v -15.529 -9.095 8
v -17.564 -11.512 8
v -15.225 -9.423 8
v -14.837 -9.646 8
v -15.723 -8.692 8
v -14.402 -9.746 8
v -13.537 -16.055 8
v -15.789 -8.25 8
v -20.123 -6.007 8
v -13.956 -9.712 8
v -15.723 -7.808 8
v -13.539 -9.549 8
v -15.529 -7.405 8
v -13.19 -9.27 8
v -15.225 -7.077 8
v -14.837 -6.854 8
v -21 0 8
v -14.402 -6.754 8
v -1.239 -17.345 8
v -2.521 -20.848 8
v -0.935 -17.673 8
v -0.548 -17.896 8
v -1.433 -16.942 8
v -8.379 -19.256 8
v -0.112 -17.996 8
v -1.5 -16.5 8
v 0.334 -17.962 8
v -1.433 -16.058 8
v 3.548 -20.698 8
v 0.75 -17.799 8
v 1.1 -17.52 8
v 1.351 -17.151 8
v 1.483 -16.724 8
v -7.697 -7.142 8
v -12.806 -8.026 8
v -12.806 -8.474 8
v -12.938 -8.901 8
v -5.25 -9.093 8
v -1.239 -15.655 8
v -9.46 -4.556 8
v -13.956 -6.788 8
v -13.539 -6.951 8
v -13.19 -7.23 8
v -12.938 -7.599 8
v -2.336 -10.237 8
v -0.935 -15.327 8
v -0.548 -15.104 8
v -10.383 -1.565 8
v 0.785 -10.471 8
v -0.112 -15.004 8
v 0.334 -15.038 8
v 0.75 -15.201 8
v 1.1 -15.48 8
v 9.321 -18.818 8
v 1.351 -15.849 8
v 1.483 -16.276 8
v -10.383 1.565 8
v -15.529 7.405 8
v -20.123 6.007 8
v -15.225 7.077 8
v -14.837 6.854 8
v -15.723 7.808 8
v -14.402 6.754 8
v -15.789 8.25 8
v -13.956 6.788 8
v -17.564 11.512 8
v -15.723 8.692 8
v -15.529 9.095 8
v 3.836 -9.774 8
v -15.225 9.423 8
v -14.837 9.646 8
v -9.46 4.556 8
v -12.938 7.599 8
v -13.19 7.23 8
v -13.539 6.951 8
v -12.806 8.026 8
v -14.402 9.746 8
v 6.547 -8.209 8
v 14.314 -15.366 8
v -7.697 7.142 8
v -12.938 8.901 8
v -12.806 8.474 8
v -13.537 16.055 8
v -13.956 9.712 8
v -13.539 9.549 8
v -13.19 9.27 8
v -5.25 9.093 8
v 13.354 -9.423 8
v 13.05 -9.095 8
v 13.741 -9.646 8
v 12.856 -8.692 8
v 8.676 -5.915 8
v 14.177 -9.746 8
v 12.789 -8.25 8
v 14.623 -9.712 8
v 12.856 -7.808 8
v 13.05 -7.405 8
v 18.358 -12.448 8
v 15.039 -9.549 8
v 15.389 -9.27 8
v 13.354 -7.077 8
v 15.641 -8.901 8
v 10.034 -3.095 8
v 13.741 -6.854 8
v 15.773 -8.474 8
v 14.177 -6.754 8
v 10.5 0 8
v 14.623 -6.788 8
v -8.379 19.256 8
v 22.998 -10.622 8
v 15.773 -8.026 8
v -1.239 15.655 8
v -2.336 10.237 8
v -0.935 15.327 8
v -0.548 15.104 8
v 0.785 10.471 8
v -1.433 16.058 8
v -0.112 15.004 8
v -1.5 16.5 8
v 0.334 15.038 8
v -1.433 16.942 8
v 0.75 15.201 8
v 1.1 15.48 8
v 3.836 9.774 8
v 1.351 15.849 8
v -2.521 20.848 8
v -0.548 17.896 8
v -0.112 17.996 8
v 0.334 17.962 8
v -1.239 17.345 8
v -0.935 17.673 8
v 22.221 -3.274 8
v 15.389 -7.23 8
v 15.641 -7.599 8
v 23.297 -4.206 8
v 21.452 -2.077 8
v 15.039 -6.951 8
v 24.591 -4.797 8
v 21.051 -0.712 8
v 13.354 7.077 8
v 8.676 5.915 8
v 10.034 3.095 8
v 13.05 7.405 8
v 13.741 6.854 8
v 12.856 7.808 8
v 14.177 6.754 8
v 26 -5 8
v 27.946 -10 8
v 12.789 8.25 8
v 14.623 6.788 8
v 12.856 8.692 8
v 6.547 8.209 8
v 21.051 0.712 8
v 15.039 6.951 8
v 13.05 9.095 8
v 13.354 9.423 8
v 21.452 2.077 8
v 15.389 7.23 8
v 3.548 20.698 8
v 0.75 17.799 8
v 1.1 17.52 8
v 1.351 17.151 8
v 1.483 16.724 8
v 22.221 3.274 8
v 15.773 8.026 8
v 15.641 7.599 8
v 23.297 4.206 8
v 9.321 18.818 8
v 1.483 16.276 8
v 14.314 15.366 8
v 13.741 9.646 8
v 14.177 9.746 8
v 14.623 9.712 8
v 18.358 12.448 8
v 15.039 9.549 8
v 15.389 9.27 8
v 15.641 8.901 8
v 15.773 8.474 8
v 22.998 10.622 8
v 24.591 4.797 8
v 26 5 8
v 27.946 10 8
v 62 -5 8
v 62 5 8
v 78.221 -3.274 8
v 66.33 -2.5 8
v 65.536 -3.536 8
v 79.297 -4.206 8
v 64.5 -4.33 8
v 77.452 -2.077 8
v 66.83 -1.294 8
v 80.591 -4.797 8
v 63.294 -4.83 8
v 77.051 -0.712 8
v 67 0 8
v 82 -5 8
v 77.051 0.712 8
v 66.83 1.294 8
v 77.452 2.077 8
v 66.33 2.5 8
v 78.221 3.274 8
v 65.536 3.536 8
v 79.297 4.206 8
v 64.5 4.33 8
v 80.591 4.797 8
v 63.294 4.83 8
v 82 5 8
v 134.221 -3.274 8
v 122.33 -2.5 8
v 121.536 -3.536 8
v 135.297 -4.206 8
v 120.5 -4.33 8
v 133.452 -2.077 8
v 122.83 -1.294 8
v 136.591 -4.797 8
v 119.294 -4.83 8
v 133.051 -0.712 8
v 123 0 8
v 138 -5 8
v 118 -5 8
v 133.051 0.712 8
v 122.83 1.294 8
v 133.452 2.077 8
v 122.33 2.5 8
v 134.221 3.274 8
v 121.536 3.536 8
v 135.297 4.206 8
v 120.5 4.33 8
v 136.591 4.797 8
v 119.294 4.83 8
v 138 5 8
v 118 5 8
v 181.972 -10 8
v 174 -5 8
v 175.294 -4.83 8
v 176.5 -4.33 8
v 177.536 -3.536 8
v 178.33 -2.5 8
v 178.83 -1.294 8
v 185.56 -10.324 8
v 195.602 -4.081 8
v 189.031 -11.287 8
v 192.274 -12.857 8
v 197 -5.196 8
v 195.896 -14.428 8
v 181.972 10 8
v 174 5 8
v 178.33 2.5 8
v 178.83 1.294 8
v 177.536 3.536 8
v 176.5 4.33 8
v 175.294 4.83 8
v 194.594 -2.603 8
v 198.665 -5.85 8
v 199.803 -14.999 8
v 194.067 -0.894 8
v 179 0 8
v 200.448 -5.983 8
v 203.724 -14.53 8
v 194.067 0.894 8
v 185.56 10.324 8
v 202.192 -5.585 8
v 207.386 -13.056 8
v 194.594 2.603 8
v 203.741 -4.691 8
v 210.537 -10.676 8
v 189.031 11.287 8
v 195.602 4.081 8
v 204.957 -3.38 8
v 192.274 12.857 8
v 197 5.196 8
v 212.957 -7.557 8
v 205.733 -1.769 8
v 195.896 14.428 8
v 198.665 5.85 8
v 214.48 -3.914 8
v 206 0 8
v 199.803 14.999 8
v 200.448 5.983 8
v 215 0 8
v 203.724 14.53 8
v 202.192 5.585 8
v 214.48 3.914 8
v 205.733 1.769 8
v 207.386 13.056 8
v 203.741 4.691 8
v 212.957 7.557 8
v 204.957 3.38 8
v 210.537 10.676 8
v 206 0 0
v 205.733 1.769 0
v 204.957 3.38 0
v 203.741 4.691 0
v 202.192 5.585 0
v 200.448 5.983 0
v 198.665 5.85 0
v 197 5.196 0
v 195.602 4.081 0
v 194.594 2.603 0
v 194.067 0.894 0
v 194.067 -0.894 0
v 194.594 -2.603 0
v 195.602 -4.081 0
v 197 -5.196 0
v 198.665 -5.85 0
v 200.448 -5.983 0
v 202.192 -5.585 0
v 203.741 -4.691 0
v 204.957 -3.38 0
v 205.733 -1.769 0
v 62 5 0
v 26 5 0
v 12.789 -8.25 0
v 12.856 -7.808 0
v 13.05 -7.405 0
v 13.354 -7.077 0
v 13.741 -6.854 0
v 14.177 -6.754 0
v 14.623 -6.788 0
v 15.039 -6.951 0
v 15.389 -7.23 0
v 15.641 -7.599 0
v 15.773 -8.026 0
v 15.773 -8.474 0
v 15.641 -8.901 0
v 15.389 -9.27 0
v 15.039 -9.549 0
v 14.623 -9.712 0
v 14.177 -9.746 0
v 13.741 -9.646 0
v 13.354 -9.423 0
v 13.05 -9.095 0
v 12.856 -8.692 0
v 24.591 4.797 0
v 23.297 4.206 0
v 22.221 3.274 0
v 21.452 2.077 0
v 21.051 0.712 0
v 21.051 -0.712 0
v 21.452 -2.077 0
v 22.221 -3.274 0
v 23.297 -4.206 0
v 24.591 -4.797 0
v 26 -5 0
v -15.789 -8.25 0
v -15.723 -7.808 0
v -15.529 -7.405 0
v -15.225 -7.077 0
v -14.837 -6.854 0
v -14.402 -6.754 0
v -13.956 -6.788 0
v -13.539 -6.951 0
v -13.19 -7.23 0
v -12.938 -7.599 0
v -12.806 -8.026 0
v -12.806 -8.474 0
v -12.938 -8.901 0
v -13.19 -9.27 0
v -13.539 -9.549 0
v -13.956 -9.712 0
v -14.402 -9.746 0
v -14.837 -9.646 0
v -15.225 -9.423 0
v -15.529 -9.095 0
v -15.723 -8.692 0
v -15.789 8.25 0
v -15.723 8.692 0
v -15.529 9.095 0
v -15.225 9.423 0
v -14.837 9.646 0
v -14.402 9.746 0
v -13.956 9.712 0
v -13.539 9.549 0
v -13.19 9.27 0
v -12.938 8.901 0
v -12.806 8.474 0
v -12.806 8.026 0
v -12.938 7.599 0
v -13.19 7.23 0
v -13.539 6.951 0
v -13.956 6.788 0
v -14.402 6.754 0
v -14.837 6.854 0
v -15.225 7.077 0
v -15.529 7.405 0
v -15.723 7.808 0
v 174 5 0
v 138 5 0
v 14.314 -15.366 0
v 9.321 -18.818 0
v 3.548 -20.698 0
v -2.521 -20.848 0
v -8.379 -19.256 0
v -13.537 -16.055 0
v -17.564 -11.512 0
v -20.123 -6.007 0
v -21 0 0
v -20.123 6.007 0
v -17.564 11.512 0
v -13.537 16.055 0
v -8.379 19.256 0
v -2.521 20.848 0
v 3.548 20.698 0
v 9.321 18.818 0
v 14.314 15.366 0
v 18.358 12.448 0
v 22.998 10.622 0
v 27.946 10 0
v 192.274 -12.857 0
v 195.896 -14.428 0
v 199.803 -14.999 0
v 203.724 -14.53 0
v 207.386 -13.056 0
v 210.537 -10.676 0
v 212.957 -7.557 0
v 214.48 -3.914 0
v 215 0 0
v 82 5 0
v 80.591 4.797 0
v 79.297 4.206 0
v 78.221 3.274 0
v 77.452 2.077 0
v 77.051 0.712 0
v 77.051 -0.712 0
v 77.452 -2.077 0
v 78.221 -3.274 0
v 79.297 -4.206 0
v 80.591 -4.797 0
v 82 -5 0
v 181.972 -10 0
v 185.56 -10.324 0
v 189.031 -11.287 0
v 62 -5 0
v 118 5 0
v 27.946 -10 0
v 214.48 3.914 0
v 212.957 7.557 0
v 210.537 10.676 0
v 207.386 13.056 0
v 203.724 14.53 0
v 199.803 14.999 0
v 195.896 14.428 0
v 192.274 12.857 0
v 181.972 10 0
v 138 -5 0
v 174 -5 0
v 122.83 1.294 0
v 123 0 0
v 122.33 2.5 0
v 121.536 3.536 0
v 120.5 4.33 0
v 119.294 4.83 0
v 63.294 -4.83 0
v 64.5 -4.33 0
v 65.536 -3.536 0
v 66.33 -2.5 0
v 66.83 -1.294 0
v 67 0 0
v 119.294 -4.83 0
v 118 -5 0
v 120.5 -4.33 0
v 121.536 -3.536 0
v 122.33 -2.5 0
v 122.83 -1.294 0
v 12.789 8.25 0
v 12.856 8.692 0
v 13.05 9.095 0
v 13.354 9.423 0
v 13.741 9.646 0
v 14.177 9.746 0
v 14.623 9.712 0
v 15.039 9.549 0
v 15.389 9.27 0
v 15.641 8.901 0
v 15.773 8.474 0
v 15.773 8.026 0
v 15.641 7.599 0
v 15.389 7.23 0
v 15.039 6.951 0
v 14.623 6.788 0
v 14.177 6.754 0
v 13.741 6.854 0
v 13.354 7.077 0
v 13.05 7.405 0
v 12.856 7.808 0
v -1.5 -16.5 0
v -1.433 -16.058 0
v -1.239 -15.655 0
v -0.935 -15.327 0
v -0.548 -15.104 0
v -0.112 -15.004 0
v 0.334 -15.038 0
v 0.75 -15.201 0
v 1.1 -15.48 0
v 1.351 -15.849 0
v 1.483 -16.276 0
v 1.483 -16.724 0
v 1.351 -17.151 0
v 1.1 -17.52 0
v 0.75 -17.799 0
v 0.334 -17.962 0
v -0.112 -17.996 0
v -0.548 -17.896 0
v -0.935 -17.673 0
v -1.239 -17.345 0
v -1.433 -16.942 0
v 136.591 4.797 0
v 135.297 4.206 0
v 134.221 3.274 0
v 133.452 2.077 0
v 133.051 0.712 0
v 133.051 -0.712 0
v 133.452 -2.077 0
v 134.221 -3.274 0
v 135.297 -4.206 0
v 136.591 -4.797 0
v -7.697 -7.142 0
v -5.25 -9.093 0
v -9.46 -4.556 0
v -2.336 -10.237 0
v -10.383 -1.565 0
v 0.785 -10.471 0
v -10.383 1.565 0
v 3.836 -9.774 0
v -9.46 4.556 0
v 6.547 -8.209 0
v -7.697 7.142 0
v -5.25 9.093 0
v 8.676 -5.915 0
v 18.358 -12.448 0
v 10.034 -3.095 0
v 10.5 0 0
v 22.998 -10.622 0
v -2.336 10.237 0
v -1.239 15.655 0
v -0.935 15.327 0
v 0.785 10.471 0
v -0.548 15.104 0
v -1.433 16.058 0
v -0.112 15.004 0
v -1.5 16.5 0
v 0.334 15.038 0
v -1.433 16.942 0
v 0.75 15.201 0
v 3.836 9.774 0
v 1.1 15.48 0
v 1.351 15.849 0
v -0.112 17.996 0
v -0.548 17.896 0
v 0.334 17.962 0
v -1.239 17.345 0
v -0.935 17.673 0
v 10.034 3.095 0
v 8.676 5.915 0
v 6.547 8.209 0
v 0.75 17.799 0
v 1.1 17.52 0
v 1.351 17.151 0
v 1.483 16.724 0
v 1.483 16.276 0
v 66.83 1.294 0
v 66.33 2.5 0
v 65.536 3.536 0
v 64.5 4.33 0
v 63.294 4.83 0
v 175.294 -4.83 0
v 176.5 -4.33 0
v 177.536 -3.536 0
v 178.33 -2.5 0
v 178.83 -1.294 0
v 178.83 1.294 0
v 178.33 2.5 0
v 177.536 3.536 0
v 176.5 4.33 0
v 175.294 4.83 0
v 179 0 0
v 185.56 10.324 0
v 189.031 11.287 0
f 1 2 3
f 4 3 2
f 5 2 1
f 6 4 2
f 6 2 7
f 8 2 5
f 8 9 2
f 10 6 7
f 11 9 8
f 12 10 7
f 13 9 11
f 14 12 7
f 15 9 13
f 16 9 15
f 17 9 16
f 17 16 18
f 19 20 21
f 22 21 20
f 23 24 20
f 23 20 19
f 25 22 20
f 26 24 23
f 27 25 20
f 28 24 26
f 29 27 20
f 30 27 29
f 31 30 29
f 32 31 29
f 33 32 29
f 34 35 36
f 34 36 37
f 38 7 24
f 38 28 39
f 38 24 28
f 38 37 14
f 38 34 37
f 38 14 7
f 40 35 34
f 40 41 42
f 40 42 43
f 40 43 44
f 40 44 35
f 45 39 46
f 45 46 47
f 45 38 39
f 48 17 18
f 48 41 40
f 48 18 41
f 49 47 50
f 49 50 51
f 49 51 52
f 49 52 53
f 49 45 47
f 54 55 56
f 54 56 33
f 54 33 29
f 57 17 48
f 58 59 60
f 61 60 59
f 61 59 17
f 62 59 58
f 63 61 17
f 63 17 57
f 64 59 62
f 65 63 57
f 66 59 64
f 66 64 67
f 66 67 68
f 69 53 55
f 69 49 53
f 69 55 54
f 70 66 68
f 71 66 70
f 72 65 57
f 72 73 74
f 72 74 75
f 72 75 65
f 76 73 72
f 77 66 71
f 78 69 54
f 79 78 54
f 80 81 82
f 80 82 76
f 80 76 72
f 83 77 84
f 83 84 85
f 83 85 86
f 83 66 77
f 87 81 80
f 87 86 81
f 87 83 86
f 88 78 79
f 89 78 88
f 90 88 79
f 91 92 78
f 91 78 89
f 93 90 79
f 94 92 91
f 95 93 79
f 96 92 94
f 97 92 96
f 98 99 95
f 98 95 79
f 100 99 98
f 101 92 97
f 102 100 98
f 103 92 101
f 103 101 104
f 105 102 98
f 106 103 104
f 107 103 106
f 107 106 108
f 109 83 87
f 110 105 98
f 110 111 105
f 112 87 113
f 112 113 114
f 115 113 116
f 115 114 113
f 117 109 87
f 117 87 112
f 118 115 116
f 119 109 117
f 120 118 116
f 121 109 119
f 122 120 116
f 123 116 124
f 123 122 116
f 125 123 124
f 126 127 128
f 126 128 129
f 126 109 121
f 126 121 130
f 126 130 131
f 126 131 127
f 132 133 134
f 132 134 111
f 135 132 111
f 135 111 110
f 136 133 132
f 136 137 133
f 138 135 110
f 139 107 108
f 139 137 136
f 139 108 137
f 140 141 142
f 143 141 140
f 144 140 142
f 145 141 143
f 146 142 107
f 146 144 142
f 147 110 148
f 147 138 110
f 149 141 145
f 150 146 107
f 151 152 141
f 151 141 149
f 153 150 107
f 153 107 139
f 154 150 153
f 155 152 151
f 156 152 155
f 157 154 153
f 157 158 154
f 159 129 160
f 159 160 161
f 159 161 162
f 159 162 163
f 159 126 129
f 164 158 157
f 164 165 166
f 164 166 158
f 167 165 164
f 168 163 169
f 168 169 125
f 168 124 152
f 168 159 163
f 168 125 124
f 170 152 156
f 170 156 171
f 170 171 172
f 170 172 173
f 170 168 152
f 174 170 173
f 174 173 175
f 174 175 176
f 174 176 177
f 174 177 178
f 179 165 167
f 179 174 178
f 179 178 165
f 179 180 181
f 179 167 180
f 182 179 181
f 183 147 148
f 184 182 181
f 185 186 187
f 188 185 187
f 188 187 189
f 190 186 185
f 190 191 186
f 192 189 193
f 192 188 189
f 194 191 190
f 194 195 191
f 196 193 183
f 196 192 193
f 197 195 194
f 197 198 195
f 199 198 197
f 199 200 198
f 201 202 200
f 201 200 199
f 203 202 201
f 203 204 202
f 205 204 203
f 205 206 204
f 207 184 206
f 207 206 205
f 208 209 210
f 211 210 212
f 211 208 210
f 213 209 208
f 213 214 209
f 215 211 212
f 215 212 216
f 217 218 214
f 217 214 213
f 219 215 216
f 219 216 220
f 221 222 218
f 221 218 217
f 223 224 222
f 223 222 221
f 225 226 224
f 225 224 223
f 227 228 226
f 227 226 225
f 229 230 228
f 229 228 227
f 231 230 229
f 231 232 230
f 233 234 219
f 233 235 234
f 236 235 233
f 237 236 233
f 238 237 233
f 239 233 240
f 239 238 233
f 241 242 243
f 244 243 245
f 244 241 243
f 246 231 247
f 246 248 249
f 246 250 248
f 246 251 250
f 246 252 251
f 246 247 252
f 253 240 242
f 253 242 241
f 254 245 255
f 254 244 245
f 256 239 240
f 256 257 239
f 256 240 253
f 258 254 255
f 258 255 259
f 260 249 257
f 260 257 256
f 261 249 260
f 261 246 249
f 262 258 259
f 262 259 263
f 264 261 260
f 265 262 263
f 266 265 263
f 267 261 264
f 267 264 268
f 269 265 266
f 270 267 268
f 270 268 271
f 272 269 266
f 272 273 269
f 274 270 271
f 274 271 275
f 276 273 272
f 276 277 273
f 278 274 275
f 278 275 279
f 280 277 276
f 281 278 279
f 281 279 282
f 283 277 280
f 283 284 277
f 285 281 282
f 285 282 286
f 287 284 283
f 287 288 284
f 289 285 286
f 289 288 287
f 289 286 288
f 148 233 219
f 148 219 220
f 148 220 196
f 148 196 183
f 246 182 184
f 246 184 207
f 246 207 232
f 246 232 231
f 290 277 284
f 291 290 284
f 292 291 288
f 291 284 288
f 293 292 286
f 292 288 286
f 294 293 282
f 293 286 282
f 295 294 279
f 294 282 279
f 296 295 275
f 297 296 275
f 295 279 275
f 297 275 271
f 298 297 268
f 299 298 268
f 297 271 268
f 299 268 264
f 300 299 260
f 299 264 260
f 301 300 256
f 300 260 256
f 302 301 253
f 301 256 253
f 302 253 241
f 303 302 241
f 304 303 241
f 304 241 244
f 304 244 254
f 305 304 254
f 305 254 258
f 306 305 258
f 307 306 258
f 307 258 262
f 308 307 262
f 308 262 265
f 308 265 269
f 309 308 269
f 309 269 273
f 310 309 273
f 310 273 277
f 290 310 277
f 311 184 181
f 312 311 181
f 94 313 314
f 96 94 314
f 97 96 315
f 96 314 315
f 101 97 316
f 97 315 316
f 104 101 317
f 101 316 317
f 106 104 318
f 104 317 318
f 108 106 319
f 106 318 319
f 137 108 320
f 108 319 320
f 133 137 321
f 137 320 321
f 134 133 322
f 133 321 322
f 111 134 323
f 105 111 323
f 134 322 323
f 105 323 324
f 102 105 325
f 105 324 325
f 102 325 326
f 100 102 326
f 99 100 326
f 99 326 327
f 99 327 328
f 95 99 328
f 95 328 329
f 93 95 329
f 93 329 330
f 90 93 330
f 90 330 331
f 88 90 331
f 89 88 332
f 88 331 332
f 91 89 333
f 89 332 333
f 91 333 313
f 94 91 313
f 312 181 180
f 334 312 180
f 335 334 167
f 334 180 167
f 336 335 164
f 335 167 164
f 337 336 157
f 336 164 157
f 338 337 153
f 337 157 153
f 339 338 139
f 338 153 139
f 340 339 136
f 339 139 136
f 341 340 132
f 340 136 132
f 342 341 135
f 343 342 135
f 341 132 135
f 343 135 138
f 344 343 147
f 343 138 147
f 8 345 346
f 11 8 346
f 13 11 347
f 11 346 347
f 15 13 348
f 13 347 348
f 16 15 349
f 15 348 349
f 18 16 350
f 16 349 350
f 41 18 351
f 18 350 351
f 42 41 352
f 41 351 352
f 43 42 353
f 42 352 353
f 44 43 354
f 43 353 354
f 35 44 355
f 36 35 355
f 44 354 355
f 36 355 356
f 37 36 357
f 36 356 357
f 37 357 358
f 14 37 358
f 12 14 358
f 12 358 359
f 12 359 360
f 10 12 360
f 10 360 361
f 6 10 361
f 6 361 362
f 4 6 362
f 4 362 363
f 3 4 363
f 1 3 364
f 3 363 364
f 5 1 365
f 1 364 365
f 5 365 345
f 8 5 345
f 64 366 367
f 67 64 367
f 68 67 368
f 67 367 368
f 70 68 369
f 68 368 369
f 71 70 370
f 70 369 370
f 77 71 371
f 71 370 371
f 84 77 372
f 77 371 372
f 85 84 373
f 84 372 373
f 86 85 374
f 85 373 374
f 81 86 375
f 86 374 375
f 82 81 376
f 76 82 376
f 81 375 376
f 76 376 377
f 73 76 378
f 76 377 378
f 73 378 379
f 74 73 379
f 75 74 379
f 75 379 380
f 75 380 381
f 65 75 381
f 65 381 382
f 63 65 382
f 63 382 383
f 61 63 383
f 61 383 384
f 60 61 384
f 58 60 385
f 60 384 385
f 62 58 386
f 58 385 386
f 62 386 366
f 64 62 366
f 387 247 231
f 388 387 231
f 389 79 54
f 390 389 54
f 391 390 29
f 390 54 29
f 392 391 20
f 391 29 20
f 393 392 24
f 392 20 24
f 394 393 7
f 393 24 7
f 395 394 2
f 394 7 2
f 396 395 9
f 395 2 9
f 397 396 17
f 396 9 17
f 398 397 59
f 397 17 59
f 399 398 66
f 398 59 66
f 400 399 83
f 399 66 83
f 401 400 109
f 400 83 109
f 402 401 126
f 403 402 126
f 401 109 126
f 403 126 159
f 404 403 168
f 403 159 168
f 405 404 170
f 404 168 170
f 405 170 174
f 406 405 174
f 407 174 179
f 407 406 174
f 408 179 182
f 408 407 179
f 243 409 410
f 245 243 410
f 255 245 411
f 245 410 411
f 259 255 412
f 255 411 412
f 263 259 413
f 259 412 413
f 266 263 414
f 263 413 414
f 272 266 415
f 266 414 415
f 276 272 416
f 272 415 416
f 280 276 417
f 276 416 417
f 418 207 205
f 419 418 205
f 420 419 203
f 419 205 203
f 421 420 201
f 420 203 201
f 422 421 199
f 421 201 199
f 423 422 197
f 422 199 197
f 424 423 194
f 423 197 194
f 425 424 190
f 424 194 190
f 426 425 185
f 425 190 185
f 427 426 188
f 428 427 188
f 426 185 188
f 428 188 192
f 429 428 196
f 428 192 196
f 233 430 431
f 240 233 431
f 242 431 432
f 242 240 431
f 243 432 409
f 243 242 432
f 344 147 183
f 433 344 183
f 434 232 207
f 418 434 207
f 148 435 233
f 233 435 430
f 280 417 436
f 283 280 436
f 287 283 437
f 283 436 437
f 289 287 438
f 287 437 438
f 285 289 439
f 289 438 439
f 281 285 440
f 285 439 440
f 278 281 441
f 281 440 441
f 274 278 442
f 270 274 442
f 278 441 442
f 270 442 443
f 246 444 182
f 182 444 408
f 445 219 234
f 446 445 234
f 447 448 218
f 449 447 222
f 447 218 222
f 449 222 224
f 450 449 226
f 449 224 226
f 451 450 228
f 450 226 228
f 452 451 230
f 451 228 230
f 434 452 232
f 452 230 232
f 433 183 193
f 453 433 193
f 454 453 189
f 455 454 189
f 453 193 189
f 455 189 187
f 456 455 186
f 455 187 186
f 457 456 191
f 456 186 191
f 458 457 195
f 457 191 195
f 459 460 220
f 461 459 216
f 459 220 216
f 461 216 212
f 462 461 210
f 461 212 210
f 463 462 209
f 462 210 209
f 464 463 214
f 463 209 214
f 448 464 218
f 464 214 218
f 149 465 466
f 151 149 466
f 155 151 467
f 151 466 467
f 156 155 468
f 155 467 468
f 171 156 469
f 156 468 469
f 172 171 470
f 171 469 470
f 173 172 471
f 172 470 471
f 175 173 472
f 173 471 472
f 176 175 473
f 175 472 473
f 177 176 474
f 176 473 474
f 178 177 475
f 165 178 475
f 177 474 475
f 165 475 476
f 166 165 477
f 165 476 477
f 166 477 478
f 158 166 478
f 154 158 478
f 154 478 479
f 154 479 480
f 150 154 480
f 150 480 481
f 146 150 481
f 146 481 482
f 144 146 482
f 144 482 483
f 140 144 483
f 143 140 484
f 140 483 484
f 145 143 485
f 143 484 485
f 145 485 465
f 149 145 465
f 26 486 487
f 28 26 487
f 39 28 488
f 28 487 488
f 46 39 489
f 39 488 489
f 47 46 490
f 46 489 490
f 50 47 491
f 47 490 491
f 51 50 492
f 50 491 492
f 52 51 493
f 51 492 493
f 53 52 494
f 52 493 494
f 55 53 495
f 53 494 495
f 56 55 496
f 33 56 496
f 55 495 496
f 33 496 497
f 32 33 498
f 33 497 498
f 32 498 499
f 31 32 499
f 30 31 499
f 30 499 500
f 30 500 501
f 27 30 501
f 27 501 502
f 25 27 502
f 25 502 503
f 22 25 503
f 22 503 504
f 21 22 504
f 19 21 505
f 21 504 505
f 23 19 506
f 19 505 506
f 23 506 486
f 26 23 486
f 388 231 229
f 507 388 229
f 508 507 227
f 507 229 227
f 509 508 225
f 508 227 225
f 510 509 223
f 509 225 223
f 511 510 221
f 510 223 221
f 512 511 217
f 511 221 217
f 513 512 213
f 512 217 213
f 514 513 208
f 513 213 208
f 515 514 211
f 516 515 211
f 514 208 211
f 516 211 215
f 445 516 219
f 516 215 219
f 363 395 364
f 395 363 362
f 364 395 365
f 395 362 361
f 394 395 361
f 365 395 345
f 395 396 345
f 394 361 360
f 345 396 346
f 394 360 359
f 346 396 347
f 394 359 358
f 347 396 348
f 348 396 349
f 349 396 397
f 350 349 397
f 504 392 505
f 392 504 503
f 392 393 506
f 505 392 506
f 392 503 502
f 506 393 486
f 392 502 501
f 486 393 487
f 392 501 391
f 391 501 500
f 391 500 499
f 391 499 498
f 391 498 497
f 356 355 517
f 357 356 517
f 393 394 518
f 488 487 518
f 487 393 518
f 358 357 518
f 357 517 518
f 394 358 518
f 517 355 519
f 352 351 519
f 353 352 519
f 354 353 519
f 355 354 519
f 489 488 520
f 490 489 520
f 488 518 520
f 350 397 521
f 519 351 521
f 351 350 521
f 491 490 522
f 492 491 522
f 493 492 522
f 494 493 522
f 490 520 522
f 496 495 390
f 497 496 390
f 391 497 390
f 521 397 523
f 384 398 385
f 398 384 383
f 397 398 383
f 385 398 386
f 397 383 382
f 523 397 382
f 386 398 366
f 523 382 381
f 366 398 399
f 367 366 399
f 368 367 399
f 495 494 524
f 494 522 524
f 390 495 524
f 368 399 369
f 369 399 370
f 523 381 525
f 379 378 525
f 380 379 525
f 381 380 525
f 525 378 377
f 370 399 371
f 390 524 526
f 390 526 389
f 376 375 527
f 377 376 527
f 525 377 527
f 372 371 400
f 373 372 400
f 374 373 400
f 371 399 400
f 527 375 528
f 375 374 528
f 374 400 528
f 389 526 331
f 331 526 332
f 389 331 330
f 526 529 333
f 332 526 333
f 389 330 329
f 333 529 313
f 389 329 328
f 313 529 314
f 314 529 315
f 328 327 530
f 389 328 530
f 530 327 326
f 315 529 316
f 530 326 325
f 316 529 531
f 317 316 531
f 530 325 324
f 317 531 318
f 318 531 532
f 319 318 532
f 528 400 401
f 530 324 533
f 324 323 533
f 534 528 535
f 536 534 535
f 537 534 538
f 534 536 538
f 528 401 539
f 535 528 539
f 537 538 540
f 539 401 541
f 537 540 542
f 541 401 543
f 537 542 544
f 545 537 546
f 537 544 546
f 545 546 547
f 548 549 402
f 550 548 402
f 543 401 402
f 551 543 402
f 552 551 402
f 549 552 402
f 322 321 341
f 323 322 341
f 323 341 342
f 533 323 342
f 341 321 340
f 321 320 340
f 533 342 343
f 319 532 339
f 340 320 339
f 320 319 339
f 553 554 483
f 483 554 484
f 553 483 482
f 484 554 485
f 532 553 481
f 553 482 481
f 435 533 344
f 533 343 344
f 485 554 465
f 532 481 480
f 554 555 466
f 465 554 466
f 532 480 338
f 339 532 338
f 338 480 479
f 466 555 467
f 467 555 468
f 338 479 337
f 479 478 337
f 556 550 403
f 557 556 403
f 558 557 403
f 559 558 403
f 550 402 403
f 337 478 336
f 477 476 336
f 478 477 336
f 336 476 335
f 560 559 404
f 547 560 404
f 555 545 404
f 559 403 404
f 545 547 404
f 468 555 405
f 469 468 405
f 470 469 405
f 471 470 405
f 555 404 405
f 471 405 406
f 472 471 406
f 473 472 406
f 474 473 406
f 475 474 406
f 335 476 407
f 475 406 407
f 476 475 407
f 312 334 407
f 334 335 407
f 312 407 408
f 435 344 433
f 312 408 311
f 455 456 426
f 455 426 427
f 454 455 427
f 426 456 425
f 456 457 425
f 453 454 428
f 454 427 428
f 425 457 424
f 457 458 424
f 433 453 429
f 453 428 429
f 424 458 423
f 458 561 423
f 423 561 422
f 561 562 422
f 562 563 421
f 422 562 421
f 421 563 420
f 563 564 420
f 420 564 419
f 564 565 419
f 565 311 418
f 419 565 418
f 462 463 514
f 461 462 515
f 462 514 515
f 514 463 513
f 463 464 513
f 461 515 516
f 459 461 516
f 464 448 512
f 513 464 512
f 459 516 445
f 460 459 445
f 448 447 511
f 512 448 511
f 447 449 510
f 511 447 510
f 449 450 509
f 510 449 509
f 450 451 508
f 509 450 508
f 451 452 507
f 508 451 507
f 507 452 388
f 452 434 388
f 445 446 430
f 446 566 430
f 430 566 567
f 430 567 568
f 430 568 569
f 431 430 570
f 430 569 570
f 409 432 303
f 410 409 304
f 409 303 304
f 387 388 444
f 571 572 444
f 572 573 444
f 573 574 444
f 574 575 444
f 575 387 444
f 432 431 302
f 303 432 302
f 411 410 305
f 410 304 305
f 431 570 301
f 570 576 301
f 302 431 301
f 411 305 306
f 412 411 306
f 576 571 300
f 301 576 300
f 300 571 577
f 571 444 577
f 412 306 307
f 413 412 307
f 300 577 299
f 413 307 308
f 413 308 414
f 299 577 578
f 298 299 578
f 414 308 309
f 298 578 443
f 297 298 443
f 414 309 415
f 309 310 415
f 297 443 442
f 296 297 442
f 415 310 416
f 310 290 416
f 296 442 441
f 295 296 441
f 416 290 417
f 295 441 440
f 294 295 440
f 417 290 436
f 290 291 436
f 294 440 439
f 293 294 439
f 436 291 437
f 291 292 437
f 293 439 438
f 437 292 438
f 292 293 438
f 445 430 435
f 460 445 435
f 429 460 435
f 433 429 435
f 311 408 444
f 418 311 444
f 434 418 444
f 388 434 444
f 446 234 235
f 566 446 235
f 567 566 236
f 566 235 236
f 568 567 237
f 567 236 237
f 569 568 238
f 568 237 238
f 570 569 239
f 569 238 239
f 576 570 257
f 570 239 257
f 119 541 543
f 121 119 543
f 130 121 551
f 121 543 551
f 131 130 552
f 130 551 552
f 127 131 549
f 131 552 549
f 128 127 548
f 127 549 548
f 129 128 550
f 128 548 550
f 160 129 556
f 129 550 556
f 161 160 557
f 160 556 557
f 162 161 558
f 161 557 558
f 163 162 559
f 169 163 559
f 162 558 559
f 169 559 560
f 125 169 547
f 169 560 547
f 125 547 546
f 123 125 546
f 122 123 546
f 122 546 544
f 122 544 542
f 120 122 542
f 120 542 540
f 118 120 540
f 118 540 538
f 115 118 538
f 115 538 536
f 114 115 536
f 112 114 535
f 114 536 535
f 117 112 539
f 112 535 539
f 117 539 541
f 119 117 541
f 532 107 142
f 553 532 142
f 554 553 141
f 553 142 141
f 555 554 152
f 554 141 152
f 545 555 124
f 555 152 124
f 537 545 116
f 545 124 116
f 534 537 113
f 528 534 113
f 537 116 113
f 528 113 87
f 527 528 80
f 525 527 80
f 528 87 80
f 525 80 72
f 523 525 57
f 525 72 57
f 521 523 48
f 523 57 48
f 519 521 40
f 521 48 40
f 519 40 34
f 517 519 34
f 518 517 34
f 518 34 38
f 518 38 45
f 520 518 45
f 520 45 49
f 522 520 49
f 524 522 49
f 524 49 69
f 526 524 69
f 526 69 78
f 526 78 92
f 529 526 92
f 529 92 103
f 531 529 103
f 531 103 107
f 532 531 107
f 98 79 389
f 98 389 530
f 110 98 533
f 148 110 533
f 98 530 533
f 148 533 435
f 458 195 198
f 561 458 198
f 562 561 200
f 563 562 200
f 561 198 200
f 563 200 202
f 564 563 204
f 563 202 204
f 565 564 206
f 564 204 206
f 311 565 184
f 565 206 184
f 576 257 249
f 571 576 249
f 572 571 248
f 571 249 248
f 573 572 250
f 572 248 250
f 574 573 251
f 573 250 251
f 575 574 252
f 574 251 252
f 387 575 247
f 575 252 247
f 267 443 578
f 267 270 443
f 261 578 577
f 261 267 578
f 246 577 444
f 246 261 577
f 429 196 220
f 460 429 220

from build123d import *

# Parameters (mm, degrees)
EXTRUDE_1_DEPTH     = 8
FILLET_1_R          = 20
SKETCH_5_R          = 10.5
SKETCH_5_R_2        = 6
CUT_EXTRUDE_4_DEPTH = 10
CUT_EXTRUDE_5_DEPTH = 10
EXTRUDE_START       = -8
SKETCH_9_R          = 10.5
EXTRUDE_3_DEPTH     = 8
FILLET_2_R          = 20
SKETCH_10_R         = 1.5
CUT_EXTRUDE_7_DEPTH = 8


with BuildPart() as part:
    # 草图1 → 凸台-拉伸1 (new body)
    with BuildSketch(Plane.XY):
        with BuildLine():
            Line((0, -10), (0, 10))
            Line((0, 10), (11.180339887, 10))
            ThreePointArc((11.180339887, 10), (-15, 0), (11.180339887, -10))
            Line((11.180339887, -10), (0, -10))
        make_face()
        with BuildLine():
            Line((11.180339887, 10), (0, 10))
            Line((0, 10), (0, -10))
            Line((0, -10), (11.180339887, -10))
            ThreePointArc((11.180339887, -10), (14.012585384, -5.352331347), (15, 0))
            ThreePointArc((15, 0), (14.012585384, 5.352331347), (11.180339887, 10))
        make_face()
        with BuildLine():
            Line((188.819660113, 10), (11.180339887, 10))
            ThreePointArc((11.180339887, 10), (14.012585384, 5.352331347), (15, 0))
            ThreePointArc((15, 0), (14.012585384, -5.352331347), (11.180339887, -10))
            Line((11.180339887, -10), (188.819660113, -10))
            ThreePointArc((188.819660113, -10), (185, 0), (188.819660113, 10))
        make_face()
        with BuildLine():
            ThreePointArc((215, 0), (205.352331347, 14.012585384), (188.819660113, 10))
            Line((188.819660113, 10), (200, 10))
            Line((200, 10), (200, -10))
            Line((200, -10), (188.819660113, -10))
            ThreePointArc((188.819660113, -10), (205.352331347, -14.012585384), (215, 0))
        make_face()
        with BuildLine():
            Line((200, 10), (188.819660113, 10))
            ThreePointArc((188.819660113, 10), (185, 0), (188.819660113, -10))
            Line((188.819660113, -10), (200, -10))
            Line((200, -10), (200, 10))
        make_face()
    extrude(amount=EXTRUDE_1_DEPTH)

    # 圆角1
    fillet_1_edges = [part.edges().sort_by_distance(p)[0] for p in [
        (11.180339887, 10, 4),
        (188.819660113, 10, 4),
        (188.819660113, -10, 4),
        (11.180339887, -10, 4),
    ]]
    fillet(fillet_1_edges, radius=FILLET_1_R)

    # 草图5 → 切除-拉伸4 (cut)
    with BuildSketch(Plane.XY.offset(8)):
        Circle(SKETCH_5_R)
        with Locations((200, 0)):
            Circle(SKETCH_5_R_2)
    extrude(amount=-CUT_EXTRUDE_4_DEPTH, mode=Mode.SUBTRACT)

    # 草图6 → 切除-拉伸5 (cut)
    with BuildSketch(Plane.XY.offset(8)):
        with BuildLine():
            ThreePointArc((138, 5), (133, 0), (138, -5))
            Line((138, -5), (138, 5))
        make_face()
        with BuildLine():
            Line((138, 5), (138, -5))
            ThreePointArc((138, -5), (141.535533906, -3.535533906), (143, 0))
            ThreePointArc((143, 0), (141.535533906, 3.535533906), (138, 5))
        make_face()
        with BuildLine():
            Line((138, -5), (174, -5))
            ThreePointArc((174, -5), (169, 0), (174, 5))
            Line((174, 5), (138, 5))
            ThreePointArc((138, 5), (141.535533906, 3.535533906), (143, 0))
            ThreePointArc((143, 0), (141.535533906, -3.535533906), (138, -5))
        make_face()
        with BuildLine():
            ThreePointArc((174, 5), (169, 0), (174, -5))
            Line((174, -5), (174, 5))
        make_face()
        with BuildLine():
            Line((174, 5), (174, -5))
            ThreePointArc((174, -5), (177.535533906, -3.535533906), (179, 0))
            ThreePointArc((179, 0), (177.535533906, 3.535533906), (174, 5))
        make_face()
        with BuildLine():
            ThreePointArc((118, 5), (113, 0), (118, -5))
            Line((118, -5), (118, 5))
        make_face()
        with BuildLine():
            Line((118, 5), (118, -5))
            ThreePointArc((118, -5), (121.535533906, -3.535533906), (123, 0))
            ThreePointArc((123, 0), (121.535533906, 3.535533906), (118, 5))
        make_face()
        with BuildLine():
            Line((82, -5), (118, -5))
            ThreePointArc((118, -5), (113, 0), (118, 5))
            Line((118, 5), (82, 5))
            ThreePointArc((82, 5), (85.535533906, 3.535533906), (87, 0))
            ThreePointArc((87, 0), (85.535533906, -3.535533906), (82, -5))
        make_face()
        with BuildLine():
            ThreePointArc((82, 5), (77, 0), (82, -5))
            Line((82, -5), (82, 5))
        make_face()
        with BuildLine():
            Line((82, 5), (82, -5))
            ThreePointArc((82, -5), (85.535533906, -3.535533906), (87, 0))
            ThreePointArc((87, 0), (85.535533906, 3.535533906), (82, 5))
        make_face()
        with BuildLine():
            ThreePointArc((62, 5), (57, 0), (62, -5))
            Line((62, -5), (62, 5))
        make_face()
        with BuildLine():
            Line((62, 5), (62, -5))
            ThreePointArc((62, -5), (65.535533906, -3.535533906), (67, 0))
            ThreePointArc((67, 0), (65.535533906, 3.535533906), (62, 5))
        make_face()
        with BuildLine():
            Line((26, -5), (62, -5))
            ThreePointArc((62, -5), (57, 0), (62, 5))
            Line((62, 5), (26, 5))
            ThreePointArc((26, 5), (29.535533906, 3.535533906), (31, 0))
            ThreePointArc((31, 0), (29.535533906, -3.535533906), (26, -5))
        make_face()
        with BuildLine():
            ThreePointArc((26, 5), (21, 0), (26, -5))
            Line((26, -5), (26, 5))
        make_face()
        with BuildLine():
            Line((26, 5), (26, -5))
            ThreePointArc((26, -5), (29.535533906, -3.535533906), (31, 0))
            ThreePointArc((31, 0), (29.535533906, 3.535533906), (26, 5))
        make_face()
    extrude(amount=-CUT_EXTRUDE_5_DEPTH, mode=Mode.SUBTRACT)

    # 草图9 → 凸台-拉伸3 (add)
    with BuildSketch(Plane(origin=(0, 0, 0), x_dir=(-1, 0, 0), z_dir=(0, 0, -1)).offset(EXTRUDE_START)):
        with BuildLine():
            Line((-18.466185313, 10), (-18.466185313, -10))
            ThreePointArc((-18.466185313, -10), (21, 0), (-18.466185313, 10))
        make_face()
        with Locations(Location((0, 0, 0), (0, 0, 180))):
            Circle(SKETCH_9_R, mode=Mode.SUBTRACT)
    extrude(amount=EXTRUDE_3_DEPTH)

    # 圆角2
    fillet_2_edges = [part.edges().sort_by_distance(p)[0] for p in [
        (18.466185313, 10, 4),
        (18.466185313, -10, 4),
    ]]
    fillet(fillet_2_edges, radius=FILLET_2_R)

    # 草图10 → 切除-拉伸7 (cut)
    with BuildSketch(Plane(origin=(0, 0, 0), x_dir=(-1, 0, 0), z_dir=(0, 0, -1))):
        with Locations((0, 16.5)):
            Circle(SKETCH_10_R)
        with Locations((14.289419162, 8.25)):
            Circle(SKETCH_10_R)
        with Locations((14.289419162, -8.25)):
            Circle(SKETCH_10_R)
        with Locations((0, -16.5)):
            Circle(SKETCH_10_R)
        with Locations((-14.289419162, -8.25)):
            Circle(SKETCH_10_R)
        with Locations((-14.289419162, 8.25)):
            Circle(SKETCH_10_R)
    extrude(amount=-CUT_EXTRUDE_7_DEPTH, mode=Mode.SUBTRACT)


solid = part.part
